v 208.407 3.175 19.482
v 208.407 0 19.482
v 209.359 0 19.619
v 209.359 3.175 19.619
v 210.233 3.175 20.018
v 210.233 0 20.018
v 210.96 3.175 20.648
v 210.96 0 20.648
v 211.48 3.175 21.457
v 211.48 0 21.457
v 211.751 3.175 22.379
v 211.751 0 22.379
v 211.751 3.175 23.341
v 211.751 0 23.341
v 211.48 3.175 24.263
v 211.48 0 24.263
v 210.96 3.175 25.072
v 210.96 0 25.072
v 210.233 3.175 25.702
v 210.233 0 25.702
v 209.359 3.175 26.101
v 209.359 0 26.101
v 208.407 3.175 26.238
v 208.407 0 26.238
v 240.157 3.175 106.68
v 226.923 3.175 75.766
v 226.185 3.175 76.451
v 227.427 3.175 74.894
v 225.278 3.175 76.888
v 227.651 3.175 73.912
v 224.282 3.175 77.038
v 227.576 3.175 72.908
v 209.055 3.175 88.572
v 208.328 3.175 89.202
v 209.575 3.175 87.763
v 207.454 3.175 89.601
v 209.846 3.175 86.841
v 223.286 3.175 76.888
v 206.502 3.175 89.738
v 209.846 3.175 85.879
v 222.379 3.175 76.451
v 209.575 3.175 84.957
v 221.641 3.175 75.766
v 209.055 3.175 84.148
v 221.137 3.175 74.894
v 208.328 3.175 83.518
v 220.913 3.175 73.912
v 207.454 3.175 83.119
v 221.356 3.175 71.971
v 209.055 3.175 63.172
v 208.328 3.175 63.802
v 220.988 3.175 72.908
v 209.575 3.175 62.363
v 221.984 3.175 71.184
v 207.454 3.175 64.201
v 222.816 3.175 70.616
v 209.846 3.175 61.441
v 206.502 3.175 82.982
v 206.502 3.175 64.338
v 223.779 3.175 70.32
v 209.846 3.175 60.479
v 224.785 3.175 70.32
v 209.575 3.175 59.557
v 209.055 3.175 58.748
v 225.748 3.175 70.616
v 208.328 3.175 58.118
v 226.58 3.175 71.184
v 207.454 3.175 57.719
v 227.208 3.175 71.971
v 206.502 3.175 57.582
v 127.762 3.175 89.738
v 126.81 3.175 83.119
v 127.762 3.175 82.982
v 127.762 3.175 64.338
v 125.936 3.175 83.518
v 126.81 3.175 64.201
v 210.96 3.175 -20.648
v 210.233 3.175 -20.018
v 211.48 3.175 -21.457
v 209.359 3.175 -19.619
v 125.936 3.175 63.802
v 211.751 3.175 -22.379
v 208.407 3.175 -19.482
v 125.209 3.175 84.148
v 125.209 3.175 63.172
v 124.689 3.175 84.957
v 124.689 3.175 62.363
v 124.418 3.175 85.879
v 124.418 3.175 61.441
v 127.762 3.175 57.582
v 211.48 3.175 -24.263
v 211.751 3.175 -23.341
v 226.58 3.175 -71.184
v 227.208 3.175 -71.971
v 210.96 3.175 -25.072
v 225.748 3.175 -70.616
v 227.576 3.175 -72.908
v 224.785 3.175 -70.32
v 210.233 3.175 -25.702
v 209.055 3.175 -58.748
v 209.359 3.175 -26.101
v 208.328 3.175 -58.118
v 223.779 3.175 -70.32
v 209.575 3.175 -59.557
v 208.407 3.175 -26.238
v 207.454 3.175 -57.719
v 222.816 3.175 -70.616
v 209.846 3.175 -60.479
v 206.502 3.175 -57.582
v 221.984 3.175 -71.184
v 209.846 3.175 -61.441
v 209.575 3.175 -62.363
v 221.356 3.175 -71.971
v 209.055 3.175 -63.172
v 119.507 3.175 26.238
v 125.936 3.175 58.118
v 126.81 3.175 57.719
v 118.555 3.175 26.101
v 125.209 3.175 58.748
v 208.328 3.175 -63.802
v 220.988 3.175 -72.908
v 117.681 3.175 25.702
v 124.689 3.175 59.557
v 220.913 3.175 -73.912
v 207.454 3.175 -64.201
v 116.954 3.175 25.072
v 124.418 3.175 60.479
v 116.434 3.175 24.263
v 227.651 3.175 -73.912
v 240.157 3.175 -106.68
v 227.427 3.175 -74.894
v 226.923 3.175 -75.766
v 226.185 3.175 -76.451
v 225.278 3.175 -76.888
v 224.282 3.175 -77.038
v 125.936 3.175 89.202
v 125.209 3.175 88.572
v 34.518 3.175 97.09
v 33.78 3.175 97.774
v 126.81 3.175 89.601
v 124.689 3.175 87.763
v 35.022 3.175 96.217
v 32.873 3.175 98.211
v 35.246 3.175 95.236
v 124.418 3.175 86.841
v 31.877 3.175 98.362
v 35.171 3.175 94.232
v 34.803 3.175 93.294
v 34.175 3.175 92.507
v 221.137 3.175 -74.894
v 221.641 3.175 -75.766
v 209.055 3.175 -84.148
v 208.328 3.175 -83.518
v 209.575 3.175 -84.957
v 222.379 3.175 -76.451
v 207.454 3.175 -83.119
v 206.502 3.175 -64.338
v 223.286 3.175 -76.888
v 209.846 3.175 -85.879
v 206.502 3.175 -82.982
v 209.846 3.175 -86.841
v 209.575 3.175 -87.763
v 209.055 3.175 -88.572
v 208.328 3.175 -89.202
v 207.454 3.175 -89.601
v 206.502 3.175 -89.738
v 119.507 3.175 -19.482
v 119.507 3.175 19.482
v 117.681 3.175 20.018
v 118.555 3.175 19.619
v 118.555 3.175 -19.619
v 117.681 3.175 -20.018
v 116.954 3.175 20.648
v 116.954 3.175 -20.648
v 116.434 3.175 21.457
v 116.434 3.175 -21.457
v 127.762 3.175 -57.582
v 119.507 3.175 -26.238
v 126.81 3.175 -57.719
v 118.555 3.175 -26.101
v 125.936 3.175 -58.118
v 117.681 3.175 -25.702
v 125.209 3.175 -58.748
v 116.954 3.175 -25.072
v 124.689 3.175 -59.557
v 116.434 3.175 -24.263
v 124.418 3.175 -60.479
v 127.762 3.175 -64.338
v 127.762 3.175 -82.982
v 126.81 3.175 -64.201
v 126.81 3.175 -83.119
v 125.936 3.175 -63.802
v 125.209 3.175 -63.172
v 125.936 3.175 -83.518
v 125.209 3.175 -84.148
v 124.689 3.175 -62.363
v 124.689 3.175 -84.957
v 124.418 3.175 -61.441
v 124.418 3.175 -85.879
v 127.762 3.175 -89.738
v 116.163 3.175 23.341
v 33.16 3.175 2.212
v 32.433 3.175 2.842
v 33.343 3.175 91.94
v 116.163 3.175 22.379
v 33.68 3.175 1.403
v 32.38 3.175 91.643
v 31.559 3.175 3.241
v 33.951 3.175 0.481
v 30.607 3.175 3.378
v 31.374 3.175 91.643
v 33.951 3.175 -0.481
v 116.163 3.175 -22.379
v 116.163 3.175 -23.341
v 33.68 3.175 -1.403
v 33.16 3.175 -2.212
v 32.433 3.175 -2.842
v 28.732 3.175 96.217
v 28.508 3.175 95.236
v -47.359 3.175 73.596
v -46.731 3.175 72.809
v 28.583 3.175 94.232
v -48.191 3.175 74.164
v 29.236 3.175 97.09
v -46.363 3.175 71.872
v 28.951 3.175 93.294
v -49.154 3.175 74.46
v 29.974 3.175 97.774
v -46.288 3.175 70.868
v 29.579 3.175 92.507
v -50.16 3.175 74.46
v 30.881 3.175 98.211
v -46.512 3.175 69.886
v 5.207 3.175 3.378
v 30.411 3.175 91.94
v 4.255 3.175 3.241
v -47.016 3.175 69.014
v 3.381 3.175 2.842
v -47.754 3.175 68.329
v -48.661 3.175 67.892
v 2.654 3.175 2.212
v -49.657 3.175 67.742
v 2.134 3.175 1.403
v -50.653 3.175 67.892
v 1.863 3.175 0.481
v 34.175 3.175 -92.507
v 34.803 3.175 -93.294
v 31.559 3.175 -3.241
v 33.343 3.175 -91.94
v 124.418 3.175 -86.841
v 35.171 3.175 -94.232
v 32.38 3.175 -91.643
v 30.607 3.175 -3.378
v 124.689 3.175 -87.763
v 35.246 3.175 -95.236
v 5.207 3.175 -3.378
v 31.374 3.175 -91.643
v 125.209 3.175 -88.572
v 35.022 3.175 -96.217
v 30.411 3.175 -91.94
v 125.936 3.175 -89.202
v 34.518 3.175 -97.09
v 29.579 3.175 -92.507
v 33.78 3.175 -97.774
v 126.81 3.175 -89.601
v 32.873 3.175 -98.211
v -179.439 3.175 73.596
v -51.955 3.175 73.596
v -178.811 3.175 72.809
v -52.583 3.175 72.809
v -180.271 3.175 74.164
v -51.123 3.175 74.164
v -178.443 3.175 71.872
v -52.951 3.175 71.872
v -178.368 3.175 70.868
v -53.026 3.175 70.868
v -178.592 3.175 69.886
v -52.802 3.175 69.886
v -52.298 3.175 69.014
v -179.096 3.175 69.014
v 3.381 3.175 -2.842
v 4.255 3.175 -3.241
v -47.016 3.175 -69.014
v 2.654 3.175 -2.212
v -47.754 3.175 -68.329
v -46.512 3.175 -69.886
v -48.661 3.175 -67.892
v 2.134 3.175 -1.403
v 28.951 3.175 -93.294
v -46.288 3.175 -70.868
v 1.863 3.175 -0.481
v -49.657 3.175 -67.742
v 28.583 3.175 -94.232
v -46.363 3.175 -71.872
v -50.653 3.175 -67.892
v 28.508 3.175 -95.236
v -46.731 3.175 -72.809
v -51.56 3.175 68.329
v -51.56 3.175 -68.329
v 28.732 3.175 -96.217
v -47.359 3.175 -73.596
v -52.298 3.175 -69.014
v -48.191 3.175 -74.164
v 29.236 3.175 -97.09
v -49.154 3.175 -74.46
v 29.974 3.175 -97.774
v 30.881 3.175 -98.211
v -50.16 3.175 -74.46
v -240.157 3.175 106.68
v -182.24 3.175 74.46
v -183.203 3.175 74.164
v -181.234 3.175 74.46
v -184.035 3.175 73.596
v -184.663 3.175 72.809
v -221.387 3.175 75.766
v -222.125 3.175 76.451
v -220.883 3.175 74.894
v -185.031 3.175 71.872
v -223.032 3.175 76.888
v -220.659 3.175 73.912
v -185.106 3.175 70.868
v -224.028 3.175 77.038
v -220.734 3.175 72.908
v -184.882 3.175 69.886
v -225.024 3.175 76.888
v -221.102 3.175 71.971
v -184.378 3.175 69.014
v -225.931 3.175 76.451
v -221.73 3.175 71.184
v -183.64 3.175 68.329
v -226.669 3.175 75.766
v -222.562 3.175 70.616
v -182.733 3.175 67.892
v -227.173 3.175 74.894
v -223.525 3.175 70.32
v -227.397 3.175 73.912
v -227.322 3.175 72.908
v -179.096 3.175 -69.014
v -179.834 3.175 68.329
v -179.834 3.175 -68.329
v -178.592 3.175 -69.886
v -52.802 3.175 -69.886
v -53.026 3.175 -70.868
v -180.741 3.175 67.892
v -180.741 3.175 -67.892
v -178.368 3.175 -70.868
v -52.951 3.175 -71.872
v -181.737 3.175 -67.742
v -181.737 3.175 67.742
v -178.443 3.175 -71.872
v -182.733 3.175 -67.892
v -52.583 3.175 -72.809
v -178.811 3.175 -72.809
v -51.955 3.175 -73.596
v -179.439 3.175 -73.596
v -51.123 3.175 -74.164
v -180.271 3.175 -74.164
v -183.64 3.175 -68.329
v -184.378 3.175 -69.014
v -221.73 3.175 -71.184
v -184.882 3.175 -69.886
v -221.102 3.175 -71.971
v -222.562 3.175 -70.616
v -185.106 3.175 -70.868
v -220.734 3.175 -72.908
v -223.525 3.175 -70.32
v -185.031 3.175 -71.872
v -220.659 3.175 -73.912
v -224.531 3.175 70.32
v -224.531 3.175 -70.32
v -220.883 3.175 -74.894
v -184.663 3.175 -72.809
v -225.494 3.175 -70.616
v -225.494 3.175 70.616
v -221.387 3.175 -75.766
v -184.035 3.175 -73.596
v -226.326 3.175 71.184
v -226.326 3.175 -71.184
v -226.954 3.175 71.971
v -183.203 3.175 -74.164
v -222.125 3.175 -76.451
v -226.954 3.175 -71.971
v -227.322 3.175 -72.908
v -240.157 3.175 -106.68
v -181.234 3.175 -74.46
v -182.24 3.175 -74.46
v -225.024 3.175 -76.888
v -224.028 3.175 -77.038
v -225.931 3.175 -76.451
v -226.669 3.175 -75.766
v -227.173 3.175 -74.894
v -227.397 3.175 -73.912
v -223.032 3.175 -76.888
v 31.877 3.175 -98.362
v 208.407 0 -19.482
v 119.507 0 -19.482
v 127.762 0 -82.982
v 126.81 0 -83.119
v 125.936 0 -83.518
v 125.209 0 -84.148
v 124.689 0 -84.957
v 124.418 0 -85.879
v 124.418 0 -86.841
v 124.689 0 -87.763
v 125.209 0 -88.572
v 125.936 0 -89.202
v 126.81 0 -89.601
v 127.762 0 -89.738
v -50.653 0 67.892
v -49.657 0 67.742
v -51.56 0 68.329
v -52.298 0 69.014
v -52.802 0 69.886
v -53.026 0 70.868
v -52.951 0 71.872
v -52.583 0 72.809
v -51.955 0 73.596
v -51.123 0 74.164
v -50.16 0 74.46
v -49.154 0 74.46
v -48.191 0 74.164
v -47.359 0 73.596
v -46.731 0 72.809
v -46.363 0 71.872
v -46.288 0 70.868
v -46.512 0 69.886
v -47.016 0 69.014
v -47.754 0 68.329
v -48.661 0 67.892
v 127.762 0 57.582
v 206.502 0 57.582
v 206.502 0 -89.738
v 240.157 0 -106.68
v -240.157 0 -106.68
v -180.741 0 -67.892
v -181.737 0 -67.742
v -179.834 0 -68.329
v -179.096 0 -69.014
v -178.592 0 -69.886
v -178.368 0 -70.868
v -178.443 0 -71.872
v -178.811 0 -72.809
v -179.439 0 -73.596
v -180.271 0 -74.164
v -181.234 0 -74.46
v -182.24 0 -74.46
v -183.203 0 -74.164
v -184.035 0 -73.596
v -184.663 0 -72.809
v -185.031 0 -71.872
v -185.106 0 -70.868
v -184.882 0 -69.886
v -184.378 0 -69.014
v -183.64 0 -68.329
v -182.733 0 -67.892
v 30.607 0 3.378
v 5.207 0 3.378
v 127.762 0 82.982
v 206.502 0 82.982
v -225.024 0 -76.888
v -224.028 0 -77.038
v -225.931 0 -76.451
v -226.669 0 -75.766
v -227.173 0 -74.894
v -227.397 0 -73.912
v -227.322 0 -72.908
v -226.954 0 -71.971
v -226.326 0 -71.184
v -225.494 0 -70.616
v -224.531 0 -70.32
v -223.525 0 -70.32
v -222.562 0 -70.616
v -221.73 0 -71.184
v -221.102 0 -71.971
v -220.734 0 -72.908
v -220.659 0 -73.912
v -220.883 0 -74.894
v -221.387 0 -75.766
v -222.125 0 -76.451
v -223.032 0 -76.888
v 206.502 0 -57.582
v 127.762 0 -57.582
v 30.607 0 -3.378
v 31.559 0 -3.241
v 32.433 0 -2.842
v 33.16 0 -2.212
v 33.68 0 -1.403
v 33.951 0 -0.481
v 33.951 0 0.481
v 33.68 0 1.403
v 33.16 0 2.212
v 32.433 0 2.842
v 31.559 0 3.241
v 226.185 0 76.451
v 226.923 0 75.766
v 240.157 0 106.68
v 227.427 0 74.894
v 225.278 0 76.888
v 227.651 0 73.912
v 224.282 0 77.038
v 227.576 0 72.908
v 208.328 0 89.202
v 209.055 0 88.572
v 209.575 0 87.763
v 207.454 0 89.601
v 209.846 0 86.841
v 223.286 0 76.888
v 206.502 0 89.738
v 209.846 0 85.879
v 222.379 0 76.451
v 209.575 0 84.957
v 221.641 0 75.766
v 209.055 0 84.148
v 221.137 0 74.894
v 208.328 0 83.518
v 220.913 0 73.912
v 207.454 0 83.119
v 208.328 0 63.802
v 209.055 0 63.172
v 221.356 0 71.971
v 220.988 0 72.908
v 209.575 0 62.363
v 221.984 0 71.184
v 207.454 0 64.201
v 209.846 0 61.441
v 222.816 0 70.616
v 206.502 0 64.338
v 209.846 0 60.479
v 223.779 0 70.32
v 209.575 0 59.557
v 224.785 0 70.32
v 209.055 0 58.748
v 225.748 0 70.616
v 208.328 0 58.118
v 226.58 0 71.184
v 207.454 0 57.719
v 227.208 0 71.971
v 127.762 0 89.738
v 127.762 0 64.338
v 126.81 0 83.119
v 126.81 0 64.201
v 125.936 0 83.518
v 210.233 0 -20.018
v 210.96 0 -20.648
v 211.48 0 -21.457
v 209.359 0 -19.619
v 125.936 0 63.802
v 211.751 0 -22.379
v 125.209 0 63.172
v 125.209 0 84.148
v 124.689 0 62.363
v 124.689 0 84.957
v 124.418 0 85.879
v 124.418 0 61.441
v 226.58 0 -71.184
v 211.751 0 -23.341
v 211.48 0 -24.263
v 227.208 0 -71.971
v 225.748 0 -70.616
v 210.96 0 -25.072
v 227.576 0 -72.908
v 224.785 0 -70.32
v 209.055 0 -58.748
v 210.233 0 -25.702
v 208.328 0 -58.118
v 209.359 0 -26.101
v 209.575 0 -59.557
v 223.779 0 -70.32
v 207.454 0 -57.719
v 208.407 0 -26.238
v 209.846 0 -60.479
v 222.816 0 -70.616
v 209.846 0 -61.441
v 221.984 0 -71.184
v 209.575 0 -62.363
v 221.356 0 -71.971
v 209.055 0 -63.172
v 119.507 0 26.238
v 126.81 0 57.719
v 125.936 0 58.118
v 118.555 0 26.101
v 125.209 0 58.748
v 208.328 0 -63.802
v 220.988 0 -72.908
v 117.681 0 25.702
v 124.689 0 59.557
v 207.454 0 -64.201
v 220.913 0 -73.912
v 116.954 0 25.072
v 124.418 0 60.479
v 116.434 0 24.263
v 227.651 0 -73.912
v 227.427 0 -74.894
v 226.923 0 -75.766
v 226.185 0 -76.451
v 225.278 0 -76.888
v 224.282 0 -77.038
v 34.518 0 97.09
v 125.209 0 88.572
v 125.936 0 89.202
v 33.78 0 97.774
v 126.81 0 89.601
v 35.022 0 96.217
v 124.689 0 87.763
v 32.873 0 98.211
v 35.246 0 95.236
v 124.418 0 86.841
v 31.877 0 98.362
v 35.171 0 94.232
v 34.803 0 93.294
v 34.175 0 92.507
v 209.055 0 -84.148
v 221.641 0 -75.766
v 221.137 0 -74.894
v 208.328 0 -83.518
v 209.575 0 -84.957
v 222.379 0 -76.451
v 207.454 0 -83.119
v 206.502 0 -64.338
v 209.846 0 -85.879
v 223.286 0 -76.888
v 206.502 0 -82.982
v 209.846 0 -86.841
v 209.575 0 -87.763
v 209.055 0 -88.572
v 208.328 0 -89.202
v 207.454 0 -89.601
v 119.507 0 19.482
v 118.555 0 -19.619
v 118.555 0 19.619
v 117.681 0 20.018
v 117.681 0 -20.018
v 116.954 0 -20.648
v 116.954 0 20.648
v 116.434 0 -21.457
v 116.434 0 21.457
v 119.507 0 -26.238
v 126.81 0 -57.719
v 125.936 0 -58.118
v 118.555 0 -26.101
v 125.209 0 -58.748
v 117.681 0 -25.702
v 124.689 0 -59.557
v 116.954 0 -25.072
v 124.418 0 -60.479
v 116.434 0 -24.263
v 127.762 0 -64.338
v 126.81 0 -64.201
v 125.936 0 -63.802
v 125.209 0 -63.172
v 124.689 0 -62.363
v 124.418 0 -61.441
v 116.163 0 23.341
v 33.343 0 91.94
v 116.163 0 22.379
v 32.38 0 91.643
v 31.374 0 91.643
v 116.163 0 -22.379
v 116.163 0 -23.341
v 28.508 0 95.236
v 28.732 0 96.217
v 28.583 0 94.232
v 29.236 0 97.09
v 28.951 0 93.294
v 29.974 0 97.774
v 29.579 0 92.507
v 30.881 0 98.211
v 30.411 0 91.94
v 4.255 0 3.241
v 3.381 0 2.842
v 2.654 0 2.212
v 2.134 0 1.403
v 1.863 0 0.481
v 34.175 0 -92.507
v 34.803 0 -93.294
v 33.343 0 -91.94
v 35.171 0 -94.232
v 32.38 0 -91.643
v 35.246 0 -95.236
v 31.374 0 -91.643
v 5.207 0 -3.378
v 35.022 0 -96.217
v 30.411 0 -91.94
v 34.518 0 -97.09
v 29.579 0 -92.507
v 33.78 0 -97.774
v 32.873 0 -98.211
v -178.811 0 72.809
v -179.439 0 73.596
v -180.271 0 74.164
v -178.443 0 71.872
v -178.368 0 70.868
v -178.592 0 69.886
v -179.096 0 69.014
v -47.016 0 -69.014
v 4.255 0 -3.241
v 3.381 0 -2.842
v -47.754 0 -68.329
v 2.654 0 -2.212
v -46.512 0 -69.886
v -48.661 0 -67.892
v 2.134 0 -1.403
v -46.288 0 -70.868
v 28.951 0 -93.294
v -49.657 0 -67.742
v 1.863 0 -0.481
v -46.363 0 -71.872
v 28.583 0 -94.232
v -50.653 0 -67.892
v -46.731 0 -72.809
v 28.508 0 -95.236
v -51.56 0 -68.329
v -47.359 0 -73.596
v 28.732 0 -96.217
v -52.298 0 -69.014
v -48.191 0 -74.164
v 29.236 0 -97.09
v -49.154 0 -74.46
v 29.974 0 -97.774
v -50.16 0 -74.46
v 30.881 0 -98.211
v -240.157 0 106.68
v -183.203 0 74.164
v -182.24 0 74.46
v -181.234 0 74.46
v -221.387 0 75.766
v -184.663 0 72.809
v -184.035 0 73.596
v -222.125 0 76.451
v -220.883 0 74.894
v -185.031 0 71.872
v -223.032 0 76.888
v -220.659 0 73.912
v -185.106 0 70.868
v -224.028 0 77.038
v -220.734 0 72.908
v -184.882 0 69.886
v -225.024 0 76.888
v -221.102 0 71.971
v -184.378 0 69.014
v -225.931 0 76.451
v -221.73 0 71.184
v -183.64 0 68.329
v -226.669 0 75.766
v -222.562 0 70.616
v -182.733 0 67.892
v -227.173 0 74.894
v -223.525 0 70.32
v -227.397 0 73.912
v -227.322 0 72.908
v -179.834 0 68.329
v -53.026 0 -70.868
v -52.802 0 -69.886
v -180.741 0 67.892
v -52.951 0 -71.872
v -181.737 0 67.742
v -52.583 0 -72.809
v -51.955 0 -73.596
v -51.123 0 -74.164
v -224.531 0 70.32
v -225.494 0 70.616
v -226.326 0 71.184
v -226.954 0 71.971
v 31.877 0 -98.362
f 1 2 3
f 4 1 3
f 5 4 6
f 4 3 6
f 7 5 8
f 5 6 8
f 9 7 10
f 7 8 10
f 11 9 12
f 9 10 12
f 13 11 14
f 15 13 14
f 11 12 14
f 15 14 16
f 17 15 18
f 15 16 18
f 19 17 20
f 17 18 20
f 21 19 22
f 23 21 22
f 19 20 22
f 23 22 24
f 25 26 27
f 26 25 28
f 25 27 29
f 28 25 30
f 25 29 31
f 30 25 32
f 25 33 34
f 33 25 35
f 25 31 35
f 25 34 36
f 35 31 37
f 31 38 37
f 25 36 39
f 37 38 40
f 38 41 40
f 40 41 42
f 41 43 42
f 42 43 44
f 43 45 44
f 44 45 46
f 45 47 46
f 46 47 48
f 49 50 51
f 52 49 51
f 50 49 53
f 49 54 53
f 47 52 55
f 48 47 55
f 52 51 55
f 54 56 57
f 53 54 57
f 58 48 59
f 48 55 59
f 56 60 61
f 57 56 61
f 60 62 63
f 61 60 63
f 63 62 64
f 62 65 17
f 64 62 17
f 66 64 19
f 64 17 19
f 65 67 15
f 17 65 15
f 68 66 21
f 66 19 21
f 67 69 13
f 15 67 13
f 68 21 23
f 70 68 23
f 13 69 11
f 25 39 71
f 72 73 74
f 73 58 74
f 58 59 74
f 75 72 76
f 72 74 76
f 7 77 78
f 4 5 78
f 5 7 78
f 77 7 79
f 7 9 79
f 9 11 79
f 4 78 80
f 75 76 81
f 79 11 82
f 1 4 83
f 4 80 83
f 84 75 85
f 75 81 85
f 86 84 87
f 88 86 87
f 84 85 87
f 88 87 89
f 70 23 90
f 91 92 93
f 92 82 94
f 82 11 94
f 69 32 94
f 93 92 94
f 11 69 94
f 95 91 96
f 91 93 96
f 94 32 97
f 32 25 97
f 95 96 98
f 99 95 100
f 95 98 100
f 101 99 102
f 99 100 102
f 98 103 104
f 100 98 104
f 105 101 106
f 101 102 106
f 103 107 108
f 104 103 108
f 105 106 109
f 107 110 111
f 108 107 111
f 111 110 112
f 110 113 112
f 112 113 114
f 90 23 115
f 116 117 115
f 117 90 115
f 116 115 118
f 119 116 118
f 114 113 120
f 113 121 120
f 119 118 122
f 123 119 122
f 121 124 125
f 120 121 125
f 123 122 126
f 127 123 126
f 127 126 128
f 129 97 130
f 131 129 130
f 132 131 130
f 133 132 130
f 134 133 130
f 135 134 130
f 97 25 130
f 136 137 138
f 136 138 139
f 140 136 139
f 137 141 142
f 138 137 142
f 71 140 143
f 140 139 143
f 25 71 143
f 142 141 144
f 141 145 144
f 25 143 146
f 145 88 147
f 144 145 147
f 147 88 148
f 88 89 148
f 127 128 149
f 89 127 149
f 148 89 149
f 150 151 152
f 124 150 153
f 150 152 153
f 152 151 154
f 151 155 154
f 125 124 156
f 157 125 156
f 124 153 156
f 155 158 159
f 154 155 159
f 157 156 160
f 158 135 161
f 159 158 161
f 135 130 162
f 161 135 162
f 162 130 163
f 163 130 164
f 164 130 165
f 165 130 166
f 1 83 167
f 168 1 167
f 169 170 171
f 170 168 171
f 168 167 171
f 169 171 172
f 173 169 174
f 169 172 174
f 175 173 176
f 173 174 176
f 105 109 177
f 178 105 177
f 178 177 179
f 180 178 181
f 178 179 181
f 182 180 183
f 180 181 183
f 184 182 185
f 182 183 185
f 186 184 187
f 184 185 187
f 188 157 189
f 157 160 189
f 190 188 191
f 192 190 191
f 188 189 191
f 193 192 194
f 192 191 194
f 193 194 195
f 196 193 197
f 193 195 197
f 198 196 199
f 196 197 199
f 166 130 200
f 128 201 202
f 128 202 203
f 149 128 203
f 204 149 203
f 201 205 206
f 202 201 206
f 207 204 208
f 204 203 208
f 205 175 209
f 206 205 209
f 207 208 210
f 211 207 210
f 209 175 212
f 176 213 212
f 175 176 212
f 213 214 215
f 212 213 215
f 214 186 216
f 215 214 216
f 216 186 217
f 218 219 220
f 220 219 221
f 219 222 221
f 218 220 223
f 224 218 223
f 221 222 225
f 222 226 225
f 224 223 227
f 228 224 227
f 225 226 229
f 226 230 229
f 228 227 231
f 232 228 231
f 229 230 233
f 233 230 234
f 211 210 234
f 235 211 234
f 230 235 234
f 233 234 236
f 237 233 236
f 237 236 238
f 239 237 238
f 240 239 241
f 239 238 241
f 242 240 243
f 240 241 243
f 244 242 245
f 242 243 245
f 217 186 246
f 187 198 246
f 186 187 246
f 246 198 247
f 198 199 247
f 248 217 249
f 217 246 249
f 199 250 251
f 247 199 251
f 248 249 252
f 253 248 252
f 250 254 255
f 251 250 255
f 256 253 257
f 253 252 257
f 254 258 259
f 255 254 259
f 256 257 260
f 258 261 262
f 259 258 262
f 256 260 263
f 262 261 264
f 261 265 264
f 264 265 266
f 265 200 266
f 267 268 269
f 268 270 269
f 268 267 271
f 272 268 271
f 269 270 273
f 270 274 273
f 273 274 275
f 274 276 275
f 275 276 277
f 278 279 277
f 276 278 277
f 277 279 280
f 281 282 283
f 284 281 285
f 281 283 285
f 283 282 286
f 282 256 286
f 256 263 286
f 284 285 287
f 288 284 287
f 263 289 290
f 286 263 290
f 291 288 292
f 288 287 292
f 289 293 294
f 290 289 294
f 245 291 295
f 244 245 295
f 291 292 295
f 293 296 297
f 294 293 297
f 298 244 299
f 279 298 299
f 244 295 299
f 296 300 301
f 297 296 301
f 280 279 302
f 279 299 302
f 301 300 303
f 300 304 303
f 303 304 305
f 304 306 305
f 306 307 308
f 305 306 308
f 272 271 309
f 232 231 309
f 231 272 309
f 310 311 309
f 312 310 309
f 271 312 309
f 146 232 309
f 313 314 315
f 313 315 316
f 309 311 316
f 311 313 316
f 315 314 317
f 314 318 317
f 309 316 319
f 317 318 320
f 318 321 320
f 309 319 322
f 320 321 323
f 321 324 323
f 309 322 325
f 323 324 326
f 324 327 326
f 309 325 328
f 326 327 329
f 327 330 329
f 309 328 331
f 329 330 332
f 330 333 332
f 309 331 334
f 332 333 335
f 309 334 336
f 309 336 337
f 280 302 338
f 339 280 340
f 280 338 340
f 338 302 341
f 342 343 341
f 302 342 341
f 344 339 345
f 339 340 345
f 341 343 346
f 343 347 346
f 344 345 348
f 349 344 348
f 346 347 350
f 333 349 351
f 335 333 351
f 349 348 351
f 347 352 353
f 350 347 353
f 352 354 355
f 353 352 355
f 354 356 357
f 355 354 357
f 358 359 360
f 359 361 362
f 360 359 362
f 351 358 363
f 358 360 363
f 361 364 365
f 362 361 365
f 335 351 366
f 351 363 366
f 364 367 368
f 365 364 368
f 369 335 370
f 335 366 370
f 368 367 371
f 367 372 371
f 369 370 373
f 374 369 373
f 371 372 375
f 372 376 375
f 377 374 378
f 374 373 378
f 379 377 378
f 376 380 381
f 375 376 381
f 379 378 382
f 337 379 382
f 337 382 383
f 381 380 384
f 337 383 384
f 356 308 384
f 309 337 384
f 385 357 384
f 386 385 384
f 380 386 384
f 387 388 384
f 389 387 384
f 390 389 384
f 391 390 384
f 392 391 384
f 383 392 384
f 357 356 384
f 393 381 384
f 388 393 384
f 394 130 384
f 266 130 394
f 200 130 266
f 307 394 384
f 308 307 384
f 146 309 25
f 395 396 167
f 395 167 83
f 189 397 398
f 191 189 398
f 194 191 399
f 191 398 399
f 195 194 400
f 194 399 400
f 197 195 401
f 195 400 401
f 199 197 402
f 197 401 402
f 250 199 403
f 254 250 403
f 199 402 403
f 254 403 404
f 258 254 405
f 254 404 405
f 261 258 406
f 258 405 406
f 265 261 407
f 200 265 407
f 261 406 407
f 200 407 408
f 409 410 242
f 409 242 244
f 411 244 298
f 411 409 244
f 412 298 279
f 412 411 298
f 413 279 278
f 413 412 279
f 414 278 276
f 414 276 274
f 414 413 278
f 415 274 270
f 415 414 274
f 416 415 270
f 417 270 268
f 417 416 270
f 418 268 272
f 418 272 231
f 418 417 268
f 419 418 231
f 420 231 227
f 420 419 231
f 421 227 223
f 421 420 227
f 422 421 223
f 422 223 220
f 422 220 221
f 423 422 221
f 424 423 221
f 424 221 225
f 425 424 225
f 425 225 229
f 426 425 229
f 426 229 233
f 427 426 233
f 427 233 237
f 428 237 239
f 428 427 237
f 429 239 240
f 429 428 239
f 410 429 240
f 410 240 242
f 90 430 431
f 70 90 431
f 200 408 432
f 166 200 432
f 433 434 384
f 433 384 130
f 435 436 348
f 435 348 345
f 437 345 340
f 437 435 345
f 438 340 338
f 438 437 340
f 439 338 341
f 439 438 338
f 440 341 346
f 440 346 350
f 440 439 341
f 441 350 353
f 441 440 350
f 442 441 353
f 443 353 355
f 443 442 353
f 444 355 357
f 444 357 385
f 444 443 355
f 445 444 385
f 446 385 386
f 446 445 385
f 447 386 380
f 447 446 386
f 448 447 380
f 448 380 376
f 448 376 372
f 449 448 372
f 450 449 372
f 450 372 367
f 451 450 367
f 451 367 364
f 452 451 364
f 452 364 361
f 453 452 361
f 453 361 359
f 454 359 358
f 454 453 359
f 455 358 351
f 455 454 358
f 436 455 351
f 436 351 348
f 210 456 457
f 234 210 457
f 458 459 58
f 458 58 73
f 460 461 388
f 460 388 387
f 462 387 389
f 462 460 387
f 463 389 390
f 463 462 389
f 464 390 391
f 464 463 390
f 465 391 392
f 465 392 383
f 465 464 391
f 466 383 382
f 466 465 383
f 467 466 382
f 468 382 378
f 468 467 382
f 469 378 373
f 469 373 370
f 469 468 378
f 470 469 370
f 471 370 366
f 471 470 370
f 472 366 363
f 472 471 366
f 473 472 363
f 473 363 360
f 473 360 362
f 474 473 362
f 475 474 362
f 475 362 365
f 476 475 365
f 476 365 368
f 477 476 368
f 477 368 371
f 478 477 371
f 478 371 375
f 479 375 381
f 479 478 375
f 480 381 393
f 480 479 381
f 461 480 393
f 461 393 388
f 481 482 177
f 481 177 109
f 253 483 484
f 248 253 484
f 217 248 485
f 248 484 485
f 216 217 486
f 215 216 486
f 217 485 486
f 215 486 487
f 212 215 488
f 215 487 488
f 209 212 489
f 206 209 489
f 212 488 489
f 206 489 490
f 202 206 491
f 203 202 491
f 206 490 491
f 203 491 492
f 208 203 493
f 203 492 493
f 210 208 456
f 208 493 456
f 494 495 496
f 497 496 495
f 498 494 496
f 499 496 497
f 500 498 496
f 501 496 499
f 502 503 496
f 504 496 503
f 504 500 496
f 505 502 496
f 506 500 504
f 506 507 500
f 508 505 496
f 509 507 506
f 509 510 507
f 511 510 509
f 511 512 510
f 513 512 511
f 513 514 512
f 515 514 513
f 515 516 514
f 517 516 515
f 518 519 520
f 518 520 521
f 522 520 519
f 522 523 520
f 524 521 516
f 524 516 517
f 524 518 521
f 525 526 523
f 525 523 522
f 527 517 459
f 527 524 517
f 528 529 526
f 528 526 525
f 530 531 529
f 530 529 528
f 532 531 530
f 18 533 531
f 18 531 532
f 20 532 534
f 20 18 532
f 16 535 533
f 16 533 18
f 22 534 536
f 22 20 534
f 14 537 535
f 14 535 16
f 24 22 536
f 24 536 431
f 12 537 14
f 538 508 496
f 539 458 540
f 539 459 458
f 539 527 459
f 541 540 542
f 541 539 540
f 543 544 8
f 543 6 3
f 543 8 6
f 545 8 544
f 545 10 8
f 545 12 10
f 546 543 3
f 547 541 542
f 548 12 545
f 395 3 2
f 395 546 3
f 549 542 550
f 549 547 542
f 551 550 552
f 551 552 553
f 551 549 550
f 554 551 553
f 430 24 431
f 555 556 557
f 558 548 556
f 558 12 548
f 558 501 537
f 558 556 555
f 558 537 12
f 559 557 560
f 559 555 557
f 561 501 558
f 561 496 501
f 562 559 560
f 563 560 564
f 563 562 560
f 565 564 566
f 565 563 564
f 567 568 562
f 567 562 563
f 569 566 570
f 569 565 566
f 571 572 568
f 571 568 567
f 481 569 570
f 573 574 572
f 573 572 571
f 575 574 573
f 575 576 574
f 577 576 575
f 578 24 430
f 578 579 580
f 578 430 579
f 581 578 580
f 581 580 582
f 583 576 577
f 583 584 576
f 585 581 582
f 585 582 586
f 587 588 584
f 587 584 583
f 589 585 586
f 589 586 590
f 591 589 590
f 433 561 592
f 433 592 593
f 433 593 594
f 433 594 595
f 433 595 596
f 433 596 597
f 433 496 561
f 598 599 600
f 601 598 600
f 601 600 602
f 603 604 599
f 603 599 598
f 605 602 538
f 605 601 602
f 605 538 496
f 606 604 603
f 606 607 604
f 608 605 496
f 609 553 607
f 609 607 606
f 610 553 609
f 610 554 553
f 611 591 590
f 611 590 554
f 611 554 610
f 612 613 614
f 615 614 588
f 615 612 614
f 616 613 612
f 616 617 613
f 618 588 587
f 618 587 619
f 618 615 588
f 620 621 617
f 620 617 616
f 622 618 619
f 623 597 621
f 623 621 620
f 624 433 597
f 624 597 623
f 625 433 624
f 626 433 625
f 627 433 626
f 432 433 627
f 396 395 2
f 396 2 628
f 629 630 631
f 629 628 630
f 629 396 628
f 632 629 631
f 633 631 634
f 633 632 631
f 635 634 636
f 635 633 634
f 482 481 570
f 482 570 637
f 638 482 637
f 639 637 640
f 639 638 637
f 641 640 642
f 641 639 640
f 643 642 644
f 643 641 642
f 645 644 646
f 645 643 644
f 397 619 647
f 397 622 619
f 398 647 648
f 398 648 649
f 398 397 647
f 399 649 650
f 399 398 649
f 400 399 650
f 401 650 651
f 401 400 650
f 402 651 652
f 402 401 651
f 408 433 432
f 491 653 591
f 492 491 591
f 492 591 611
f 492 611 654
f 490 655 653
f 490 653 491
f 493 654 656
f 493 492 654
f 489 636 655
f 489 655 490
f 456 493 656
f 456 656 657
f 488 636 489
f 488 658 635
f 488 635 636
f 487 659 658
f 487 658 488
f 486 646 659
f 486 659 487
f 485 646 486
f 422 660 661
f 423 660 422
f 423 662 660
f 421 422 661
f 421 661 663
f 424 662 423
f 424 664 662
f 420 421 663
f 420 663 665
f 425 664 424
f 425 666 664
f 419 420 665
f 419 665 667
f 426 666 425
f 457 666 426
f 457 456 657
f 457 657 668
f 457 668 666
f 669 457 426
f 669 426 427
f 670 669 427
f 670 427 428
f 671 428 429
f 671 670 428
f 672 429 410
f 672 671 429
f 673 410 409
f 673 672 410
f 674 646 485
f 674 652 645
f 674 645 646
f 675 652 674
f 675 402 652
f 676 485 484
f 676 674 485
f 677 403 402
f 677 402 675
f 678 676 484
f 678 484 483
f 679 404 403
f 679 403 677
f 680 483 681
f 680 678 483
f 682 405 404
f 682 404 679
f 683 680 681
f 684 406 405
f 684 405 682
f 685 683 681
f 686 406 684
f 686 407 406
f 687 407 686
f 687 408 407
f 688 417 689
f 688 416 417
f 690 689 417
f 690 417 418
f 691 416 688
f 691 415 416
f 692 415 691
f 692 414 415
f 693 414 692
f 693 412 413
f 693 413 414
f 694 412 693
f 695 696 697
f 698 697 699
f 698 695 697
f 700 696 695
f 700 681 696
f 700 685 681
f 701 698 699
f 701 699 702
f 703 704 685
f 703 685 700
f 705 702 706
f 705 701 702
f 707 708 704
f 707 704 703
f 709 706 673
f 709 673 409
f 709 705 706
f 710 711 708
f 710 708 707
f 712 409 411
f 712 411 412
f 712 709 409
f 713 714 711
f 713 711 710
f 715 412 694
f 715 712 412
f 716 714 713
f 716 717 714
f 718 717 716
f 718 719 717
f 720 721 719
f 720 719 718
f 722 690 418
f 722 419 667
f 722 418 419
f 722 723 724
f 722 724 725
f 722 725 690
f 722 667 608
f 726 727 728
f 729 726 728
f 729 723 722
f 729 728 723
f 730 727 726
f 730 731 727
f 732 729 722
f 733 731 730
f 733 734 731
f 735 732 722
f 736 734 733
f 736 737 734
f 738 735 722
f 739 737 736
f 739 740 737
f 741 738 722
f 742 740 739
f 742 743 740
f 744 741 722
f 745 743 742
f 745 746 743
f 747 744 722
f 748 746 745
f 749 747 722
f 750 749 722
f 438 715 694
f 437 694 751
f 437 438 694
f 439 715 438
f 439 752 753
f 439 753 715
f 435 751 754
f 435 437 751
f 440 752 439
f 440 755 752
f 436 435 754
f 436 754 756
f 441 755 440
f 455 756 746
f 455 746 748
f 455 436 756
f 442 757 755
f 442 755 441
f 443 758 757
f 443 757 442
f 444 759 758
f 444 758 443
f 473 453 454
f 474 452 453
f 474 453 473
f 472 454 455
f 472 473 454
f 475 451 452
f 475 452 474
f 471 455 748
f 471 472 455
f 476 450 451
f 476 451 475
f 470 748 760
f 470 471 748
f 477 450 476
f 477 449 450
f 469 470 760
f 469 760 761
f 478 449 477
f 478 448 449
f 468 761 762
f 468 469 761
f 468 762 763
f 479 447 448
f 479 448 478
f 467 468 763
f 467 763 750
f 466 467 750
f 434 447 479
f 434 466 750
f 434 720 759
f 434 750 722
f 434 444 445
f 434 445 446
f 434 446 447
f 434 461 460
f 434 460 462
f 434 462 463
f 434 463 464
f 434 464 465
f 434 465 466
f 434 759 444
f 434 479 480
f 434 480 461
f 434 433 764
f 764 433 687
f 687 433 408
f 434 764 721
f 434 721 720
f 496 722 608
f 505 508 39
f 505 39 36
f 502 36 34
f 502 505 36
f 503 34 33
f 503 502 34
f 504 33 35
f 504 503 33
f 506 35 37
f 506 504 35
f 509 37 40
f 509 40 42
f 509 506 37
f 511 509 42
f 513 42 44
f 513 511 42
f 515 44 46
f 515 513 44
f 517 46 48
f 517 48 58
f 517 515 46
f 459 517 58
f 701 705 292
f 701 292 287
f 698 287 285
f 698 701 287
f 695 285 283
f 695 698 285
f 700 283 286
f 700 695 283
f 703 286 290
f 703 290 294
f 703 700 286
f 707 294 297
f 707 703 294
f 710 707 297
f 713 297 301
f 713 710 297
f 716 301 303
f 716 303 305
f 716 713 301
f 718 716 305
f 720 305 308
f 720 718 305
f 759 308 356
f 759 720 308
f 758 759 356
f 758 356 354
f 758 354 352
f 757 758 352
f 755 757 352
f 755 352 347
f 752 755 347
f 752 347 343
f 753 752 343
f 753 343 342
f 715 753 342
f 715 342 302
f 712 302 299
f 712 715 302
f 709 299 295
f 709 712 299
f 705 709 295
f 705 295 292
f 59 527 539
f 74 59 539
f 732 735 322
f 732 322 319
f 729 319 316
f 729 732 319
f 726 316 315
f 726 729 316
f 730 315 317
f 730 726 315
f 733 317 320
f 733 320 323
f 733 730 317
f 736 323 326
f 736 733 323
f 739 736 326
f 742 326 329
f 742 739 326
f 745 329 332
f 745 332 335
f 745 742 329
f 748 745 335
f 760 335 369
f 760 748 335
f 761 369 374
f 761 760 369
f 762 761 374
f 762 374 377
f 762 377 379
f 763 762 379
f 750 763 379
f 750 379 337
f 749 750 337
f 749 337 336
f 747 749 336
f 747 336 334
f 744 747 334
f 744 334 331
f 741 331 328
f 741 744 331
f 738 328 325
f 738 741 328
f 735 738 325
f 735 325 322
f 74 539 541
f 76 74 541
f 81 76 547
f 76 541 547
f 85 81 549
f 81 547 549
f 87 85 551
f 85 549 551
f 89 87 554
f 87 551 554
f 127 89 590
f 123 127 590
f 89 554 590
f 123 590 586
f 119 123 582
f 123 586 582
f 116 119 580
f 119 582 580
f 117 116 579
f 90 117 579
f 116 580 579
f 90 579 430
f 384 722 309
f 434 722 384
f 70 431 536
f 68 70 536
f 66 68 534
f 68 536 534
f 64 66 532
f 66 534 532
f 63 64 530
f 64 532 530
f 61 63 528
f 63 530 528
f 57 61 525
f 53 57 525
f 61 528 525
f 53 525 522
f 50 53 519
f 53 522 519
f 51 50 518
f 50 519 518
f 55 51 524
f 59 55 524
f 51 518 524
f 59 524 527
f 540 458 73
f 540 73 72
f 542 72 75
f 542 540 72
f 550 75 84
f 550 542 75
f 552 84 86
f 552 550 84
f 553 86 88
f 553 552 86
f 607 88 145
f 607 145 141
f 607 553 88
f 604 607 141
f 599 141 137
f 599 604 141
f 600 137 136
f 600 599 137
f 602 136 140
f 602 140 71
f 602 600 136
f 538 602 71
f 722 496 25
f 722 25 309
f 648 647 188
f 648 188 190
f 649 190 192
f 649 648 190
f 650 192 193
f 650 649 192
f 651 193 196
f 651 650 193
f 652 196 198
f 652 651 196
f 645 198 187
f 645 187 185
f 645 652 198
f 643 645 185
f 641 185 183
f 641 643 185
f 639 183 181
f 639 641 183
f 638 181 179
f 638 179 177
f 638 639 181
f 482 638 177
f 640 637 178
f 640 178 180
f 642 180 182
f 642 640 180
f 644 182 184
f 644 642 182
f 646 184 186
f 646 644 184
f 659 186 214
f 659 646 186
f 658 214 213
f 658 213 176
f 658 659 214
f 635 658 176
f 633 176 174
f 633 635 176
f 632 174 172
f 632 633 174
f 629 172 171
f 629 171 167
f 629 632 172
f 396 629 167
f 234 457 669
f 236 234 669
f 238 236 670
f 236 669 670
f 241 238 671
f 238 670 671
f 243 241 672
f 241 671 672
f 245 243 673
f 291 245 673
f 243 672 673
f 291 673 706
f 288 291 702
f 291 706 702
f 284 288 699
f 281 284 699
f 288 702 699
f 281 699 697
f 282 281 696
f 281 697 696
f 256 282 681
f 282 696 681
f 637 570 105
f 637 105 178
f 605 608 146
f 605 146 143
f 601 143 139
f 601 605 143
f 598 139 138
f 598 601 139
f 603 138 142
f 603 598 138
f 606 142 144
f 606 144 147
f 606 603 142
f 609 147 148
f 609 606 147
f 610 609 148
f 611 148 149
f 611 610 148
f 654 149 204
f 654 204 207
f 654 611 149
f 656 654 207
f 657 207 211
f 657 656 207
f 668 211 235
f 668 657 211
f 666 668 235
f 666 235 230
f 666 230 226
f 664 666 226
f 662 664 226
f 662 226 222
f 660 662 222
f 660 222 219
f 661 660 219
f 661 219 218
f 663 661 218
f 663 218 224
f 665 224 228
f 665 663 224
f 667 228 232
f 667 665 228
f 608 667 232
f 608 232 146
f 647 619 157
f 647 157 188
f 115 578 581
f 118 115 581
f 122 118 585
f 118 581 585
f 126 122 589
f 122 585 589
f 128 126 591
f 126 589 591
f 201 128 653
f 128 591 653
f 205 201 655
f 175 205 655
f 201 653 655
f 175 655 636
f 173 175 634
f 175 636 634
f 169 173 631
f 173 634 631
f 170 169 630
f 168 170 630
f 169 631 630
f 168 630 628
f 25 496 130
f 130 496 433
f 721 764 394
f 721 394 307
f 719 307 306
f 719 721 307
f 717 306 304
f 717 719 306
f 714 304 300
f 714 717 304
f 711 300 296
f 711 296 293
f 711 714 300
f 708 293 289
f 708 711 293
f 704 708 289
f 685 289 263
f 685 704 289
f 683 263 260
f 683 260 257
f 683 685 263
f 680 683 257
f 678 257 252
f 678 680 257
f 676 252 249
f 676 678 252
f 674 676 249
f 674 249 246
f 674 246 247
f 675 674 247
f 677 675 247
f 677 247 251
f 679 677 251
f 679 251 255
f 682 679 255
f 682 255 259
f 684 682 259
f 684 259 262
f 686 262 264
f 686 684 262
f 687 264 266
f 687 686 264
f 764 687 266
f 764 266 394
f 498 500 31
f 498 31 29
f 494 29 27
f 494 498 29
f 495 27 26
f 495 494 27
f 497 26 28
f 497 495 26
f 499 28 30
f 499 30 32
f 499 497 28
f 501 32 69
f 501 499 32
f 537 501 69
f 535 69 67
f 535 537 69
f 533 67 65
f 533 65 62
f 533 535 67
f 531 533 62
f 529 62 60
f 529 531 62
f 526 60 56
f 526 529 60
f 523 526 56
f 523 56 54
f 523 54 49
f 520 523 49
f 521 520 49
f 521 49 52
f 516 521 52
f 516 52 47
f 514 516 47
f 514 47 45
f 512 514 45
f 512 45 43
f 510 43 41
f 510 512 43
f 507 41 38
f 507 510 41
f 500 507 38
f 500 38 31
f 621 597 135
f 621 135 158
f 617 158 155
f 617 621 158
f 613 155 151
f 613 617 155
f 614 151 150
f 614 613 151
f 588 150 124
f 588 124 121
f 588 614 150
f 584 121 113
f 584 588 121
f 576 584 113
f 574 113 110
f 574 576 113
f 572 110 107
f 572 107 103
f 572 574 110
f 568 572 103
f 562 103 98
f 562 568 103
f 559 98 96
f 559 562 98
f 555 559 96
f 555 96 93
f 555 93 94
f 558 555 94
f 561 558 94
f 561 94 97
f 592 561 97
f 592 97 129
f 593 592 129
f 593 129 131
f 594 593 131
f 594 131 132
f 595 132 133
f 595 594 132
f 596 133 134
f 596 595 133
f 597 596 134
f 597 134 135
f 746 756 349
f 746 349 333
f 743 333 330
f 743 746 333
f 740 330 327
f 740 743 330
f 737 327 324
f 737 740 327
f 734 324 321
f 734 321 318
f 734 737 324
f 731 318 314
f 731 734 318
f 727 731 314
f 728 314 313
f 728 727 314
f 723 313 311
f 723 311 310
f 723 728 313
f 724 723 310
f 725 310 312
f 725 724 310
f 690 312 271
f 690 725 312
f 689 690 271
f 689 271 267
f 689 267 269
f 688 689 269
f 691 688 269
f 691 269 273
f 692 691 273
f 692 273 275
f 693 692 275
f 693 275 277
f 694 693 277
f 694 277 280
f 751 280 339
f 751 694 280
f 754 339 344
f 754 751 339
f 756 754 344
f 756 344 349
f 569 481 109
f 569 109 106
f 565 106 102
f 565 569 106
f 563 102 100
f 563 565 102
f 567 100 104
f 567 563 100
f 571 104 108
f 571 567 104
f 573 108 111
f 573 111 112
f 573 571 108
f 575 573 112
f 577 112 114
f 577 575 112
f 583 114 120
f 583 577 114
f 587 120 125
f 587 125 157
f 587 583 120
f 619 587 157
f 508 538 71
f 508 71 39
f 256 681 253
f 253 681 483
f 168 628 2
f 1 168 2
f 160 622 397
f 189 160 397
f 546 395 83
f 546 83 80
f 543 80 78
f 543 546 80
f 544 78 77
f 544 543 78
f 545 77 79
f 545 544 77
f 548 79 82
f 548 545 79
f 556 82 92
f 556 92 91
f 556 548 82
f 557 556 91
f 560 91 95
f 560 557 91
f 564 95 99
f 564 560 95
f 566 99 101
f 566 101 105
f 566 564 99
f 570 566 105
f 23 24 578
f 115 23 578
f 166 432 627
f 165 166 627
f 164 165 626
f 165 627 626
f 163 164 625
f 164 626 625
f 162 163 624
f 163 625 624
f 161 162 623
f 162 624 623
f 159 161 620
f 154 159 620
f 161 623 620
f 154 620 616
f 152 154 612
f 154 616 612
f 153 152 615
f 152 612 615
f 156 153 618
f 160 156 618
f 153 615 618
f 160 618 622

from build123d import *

# Parameters (mm, degrees)
SKETCH1_R           = 3.3782
BOSS_EXTRUDE1_DEPTH = 3.175


with BuildPart() as part:
    # Sketch1 → Boss-Extrude1 (new body)
    with BuildSketch(Plane(origin=(0, 0, 0), x_dir=(1, 0, 0), z_dir=(0, 1, 0))):
        Polygon((-240.157, 106.68), (240.157, 106.68), (240.157, -73.66), (240.157, -106.68), (-240.157, -106.68), align=None)
        with Locations(Location((224.282, -73.66, 0), (0, 0, 270))):
            Circle(SKETCH1_R, mode=Mode.SUBTRACT)
        with Locations(Location((31.877, -94.9833, 0), (0, 0, 270))):
            Circle(SKETCH1_R, mode=Mode.SUBTRACT)
        with Locations(Location((31.877, 94.9833, 0), (0, 0, 90))):
            Circle(SKETCH1_R, mode=Mode.SUBTRACT)
        with Locations(Location((224.282, 73.66, 0), (0, 0, 90))):
            Circle(SKETCH1_R, mode=Mode.SUBTRACT)
        with Locations(Location((-224.028, 73.66, 0), (0, 0, 90))):
            Circle(SKETCH1_R, mode=Mode.SUBTRACT)
        with Locations(Location((-224.028, -73.66, 0), (0, 0, 270))):
            Circle(SKETCH1_R, mode=Mode.SUBTRACT)
        with Locations(Location((-181.737, 71.12, 0), (0, 0, 270))):
            Circle(SKETCH1_R, mode=Mode.SUBTRACT)
        with Locations(Location((-49.657, 71.12, 0), (0, 0, 270))):
            Circle(SKETCH1_R, mode=Mode.SUBTRACT)
        with Locations(Location((-49.657, -71.12, 0), (0, 0, 90))):
            Circle(SKETCH1_R, mode=Mode.SUBTRACT)
        with Locations(Location((-181.737, -71.12, 0), (0, 0, 90))):
            Circle(SKETCH1_R, mode=Mode.SUBTRACT)
        with BuildLine():
            Line((119.507, -19.4818), (208.407, -19.4818))
            ThreePointArc((208.407, -19.4818), (211.7852, -22.86), (208.407, -26.2382))
            Line((208.407, -26.2382), (119.507, -26.2382))
            ThreePointArc((119.507, -26.2382), (116.1288, -22.86), (119.507, -19.4818))
        make_face(mode=Mode.SUBTRACT)
        with BuildLine():
            Line((119.507, 19.4818), (208.407, 19.4818))
            ThreePointArc((208.407, 19.4818), (211.7852, 22.86), (208.407, 26.2382))
            Line((208.407, 26.2382), (119.507, 26.2382))
            ThreePointArc((119.507, 26.2382), (116.1288, 22.86), (119.507, 19.4818))
        make_face(mode=Mode.SUBTRACT)
        with BuildLine():
            Line((127.762, -57.5818), (206.502, -57.5818))
            ThreePointArc((206.502, -57.5818), (209.8802, -60.96), (206.502, -64.3382))
            Line((206.502, -64.3382), (127.762, -64.3382))
            ThreePointArc((127.762, -64.3382), (124.3838, -60.96), (127.762, -57.5818))
        make_face(mode=Mode.SUBTRACT)
        with BuildLine():
            Line((127.762, -89.7382), (206.502, -89.7382))
            ThreePointArc((206.502, -89.7382), (209.8802, -86.36), (206.502, -82.9818))
            Line((206.502, -82.9818), (127.762, -82.9818))
            ThreePointArc((127.762, -82.9818), (124.3838, -86.36), (127.762, -89.7382))
        make_face(mode=Mode.SUBTRACT)
        with BuildLine():
            Line((127.762, 57.5818), (206.502, 57.5818))
            ThreePointArc((206.502, 57.5818), (209.8802, 60.96), (206.502, 64.3382))
            Line((206.502, 64.3382), (127.762, 64.3382))
            ThreePointArc((127.762, 64.3382), (124.3838, 60.96), (127.762, 57.5818))
        make_face(mode=Mode.SUBTRACT)
        with BuildLine():
            Line((127.762, 89.7382), (206.502, 89.7382))
            ThreePointArc((206.502, 89.7382), (209.8802, 86.36), (206.502, 82.9818))
            Line((206.502, 82.9818), (127.762, 82.9818))
            ThreePointArc((127.762, 82.9818), (124.3838, 86.36), (127.762, 89.7382))
        make_face(mode=Mode.SUBTRACT)
        with BuildLine():
            Line((5.207, 3.3782), (30.607, 3.3782))
            ThreePointArc((30.607, 3.3782), (33.9852, 0), (30.607, -3.3782))
            Line((30.607, -3.3782), (5.207, -3.3782))
            ThreePointArc((5.207, -3.3782), (1.8288, 0), (5.207, 3.3782))
        make_face(mode=Mode.SUBTRACT)
    extrude(amount=BOSS_EXTRUDE1_DEPTH)


solid = part.part
